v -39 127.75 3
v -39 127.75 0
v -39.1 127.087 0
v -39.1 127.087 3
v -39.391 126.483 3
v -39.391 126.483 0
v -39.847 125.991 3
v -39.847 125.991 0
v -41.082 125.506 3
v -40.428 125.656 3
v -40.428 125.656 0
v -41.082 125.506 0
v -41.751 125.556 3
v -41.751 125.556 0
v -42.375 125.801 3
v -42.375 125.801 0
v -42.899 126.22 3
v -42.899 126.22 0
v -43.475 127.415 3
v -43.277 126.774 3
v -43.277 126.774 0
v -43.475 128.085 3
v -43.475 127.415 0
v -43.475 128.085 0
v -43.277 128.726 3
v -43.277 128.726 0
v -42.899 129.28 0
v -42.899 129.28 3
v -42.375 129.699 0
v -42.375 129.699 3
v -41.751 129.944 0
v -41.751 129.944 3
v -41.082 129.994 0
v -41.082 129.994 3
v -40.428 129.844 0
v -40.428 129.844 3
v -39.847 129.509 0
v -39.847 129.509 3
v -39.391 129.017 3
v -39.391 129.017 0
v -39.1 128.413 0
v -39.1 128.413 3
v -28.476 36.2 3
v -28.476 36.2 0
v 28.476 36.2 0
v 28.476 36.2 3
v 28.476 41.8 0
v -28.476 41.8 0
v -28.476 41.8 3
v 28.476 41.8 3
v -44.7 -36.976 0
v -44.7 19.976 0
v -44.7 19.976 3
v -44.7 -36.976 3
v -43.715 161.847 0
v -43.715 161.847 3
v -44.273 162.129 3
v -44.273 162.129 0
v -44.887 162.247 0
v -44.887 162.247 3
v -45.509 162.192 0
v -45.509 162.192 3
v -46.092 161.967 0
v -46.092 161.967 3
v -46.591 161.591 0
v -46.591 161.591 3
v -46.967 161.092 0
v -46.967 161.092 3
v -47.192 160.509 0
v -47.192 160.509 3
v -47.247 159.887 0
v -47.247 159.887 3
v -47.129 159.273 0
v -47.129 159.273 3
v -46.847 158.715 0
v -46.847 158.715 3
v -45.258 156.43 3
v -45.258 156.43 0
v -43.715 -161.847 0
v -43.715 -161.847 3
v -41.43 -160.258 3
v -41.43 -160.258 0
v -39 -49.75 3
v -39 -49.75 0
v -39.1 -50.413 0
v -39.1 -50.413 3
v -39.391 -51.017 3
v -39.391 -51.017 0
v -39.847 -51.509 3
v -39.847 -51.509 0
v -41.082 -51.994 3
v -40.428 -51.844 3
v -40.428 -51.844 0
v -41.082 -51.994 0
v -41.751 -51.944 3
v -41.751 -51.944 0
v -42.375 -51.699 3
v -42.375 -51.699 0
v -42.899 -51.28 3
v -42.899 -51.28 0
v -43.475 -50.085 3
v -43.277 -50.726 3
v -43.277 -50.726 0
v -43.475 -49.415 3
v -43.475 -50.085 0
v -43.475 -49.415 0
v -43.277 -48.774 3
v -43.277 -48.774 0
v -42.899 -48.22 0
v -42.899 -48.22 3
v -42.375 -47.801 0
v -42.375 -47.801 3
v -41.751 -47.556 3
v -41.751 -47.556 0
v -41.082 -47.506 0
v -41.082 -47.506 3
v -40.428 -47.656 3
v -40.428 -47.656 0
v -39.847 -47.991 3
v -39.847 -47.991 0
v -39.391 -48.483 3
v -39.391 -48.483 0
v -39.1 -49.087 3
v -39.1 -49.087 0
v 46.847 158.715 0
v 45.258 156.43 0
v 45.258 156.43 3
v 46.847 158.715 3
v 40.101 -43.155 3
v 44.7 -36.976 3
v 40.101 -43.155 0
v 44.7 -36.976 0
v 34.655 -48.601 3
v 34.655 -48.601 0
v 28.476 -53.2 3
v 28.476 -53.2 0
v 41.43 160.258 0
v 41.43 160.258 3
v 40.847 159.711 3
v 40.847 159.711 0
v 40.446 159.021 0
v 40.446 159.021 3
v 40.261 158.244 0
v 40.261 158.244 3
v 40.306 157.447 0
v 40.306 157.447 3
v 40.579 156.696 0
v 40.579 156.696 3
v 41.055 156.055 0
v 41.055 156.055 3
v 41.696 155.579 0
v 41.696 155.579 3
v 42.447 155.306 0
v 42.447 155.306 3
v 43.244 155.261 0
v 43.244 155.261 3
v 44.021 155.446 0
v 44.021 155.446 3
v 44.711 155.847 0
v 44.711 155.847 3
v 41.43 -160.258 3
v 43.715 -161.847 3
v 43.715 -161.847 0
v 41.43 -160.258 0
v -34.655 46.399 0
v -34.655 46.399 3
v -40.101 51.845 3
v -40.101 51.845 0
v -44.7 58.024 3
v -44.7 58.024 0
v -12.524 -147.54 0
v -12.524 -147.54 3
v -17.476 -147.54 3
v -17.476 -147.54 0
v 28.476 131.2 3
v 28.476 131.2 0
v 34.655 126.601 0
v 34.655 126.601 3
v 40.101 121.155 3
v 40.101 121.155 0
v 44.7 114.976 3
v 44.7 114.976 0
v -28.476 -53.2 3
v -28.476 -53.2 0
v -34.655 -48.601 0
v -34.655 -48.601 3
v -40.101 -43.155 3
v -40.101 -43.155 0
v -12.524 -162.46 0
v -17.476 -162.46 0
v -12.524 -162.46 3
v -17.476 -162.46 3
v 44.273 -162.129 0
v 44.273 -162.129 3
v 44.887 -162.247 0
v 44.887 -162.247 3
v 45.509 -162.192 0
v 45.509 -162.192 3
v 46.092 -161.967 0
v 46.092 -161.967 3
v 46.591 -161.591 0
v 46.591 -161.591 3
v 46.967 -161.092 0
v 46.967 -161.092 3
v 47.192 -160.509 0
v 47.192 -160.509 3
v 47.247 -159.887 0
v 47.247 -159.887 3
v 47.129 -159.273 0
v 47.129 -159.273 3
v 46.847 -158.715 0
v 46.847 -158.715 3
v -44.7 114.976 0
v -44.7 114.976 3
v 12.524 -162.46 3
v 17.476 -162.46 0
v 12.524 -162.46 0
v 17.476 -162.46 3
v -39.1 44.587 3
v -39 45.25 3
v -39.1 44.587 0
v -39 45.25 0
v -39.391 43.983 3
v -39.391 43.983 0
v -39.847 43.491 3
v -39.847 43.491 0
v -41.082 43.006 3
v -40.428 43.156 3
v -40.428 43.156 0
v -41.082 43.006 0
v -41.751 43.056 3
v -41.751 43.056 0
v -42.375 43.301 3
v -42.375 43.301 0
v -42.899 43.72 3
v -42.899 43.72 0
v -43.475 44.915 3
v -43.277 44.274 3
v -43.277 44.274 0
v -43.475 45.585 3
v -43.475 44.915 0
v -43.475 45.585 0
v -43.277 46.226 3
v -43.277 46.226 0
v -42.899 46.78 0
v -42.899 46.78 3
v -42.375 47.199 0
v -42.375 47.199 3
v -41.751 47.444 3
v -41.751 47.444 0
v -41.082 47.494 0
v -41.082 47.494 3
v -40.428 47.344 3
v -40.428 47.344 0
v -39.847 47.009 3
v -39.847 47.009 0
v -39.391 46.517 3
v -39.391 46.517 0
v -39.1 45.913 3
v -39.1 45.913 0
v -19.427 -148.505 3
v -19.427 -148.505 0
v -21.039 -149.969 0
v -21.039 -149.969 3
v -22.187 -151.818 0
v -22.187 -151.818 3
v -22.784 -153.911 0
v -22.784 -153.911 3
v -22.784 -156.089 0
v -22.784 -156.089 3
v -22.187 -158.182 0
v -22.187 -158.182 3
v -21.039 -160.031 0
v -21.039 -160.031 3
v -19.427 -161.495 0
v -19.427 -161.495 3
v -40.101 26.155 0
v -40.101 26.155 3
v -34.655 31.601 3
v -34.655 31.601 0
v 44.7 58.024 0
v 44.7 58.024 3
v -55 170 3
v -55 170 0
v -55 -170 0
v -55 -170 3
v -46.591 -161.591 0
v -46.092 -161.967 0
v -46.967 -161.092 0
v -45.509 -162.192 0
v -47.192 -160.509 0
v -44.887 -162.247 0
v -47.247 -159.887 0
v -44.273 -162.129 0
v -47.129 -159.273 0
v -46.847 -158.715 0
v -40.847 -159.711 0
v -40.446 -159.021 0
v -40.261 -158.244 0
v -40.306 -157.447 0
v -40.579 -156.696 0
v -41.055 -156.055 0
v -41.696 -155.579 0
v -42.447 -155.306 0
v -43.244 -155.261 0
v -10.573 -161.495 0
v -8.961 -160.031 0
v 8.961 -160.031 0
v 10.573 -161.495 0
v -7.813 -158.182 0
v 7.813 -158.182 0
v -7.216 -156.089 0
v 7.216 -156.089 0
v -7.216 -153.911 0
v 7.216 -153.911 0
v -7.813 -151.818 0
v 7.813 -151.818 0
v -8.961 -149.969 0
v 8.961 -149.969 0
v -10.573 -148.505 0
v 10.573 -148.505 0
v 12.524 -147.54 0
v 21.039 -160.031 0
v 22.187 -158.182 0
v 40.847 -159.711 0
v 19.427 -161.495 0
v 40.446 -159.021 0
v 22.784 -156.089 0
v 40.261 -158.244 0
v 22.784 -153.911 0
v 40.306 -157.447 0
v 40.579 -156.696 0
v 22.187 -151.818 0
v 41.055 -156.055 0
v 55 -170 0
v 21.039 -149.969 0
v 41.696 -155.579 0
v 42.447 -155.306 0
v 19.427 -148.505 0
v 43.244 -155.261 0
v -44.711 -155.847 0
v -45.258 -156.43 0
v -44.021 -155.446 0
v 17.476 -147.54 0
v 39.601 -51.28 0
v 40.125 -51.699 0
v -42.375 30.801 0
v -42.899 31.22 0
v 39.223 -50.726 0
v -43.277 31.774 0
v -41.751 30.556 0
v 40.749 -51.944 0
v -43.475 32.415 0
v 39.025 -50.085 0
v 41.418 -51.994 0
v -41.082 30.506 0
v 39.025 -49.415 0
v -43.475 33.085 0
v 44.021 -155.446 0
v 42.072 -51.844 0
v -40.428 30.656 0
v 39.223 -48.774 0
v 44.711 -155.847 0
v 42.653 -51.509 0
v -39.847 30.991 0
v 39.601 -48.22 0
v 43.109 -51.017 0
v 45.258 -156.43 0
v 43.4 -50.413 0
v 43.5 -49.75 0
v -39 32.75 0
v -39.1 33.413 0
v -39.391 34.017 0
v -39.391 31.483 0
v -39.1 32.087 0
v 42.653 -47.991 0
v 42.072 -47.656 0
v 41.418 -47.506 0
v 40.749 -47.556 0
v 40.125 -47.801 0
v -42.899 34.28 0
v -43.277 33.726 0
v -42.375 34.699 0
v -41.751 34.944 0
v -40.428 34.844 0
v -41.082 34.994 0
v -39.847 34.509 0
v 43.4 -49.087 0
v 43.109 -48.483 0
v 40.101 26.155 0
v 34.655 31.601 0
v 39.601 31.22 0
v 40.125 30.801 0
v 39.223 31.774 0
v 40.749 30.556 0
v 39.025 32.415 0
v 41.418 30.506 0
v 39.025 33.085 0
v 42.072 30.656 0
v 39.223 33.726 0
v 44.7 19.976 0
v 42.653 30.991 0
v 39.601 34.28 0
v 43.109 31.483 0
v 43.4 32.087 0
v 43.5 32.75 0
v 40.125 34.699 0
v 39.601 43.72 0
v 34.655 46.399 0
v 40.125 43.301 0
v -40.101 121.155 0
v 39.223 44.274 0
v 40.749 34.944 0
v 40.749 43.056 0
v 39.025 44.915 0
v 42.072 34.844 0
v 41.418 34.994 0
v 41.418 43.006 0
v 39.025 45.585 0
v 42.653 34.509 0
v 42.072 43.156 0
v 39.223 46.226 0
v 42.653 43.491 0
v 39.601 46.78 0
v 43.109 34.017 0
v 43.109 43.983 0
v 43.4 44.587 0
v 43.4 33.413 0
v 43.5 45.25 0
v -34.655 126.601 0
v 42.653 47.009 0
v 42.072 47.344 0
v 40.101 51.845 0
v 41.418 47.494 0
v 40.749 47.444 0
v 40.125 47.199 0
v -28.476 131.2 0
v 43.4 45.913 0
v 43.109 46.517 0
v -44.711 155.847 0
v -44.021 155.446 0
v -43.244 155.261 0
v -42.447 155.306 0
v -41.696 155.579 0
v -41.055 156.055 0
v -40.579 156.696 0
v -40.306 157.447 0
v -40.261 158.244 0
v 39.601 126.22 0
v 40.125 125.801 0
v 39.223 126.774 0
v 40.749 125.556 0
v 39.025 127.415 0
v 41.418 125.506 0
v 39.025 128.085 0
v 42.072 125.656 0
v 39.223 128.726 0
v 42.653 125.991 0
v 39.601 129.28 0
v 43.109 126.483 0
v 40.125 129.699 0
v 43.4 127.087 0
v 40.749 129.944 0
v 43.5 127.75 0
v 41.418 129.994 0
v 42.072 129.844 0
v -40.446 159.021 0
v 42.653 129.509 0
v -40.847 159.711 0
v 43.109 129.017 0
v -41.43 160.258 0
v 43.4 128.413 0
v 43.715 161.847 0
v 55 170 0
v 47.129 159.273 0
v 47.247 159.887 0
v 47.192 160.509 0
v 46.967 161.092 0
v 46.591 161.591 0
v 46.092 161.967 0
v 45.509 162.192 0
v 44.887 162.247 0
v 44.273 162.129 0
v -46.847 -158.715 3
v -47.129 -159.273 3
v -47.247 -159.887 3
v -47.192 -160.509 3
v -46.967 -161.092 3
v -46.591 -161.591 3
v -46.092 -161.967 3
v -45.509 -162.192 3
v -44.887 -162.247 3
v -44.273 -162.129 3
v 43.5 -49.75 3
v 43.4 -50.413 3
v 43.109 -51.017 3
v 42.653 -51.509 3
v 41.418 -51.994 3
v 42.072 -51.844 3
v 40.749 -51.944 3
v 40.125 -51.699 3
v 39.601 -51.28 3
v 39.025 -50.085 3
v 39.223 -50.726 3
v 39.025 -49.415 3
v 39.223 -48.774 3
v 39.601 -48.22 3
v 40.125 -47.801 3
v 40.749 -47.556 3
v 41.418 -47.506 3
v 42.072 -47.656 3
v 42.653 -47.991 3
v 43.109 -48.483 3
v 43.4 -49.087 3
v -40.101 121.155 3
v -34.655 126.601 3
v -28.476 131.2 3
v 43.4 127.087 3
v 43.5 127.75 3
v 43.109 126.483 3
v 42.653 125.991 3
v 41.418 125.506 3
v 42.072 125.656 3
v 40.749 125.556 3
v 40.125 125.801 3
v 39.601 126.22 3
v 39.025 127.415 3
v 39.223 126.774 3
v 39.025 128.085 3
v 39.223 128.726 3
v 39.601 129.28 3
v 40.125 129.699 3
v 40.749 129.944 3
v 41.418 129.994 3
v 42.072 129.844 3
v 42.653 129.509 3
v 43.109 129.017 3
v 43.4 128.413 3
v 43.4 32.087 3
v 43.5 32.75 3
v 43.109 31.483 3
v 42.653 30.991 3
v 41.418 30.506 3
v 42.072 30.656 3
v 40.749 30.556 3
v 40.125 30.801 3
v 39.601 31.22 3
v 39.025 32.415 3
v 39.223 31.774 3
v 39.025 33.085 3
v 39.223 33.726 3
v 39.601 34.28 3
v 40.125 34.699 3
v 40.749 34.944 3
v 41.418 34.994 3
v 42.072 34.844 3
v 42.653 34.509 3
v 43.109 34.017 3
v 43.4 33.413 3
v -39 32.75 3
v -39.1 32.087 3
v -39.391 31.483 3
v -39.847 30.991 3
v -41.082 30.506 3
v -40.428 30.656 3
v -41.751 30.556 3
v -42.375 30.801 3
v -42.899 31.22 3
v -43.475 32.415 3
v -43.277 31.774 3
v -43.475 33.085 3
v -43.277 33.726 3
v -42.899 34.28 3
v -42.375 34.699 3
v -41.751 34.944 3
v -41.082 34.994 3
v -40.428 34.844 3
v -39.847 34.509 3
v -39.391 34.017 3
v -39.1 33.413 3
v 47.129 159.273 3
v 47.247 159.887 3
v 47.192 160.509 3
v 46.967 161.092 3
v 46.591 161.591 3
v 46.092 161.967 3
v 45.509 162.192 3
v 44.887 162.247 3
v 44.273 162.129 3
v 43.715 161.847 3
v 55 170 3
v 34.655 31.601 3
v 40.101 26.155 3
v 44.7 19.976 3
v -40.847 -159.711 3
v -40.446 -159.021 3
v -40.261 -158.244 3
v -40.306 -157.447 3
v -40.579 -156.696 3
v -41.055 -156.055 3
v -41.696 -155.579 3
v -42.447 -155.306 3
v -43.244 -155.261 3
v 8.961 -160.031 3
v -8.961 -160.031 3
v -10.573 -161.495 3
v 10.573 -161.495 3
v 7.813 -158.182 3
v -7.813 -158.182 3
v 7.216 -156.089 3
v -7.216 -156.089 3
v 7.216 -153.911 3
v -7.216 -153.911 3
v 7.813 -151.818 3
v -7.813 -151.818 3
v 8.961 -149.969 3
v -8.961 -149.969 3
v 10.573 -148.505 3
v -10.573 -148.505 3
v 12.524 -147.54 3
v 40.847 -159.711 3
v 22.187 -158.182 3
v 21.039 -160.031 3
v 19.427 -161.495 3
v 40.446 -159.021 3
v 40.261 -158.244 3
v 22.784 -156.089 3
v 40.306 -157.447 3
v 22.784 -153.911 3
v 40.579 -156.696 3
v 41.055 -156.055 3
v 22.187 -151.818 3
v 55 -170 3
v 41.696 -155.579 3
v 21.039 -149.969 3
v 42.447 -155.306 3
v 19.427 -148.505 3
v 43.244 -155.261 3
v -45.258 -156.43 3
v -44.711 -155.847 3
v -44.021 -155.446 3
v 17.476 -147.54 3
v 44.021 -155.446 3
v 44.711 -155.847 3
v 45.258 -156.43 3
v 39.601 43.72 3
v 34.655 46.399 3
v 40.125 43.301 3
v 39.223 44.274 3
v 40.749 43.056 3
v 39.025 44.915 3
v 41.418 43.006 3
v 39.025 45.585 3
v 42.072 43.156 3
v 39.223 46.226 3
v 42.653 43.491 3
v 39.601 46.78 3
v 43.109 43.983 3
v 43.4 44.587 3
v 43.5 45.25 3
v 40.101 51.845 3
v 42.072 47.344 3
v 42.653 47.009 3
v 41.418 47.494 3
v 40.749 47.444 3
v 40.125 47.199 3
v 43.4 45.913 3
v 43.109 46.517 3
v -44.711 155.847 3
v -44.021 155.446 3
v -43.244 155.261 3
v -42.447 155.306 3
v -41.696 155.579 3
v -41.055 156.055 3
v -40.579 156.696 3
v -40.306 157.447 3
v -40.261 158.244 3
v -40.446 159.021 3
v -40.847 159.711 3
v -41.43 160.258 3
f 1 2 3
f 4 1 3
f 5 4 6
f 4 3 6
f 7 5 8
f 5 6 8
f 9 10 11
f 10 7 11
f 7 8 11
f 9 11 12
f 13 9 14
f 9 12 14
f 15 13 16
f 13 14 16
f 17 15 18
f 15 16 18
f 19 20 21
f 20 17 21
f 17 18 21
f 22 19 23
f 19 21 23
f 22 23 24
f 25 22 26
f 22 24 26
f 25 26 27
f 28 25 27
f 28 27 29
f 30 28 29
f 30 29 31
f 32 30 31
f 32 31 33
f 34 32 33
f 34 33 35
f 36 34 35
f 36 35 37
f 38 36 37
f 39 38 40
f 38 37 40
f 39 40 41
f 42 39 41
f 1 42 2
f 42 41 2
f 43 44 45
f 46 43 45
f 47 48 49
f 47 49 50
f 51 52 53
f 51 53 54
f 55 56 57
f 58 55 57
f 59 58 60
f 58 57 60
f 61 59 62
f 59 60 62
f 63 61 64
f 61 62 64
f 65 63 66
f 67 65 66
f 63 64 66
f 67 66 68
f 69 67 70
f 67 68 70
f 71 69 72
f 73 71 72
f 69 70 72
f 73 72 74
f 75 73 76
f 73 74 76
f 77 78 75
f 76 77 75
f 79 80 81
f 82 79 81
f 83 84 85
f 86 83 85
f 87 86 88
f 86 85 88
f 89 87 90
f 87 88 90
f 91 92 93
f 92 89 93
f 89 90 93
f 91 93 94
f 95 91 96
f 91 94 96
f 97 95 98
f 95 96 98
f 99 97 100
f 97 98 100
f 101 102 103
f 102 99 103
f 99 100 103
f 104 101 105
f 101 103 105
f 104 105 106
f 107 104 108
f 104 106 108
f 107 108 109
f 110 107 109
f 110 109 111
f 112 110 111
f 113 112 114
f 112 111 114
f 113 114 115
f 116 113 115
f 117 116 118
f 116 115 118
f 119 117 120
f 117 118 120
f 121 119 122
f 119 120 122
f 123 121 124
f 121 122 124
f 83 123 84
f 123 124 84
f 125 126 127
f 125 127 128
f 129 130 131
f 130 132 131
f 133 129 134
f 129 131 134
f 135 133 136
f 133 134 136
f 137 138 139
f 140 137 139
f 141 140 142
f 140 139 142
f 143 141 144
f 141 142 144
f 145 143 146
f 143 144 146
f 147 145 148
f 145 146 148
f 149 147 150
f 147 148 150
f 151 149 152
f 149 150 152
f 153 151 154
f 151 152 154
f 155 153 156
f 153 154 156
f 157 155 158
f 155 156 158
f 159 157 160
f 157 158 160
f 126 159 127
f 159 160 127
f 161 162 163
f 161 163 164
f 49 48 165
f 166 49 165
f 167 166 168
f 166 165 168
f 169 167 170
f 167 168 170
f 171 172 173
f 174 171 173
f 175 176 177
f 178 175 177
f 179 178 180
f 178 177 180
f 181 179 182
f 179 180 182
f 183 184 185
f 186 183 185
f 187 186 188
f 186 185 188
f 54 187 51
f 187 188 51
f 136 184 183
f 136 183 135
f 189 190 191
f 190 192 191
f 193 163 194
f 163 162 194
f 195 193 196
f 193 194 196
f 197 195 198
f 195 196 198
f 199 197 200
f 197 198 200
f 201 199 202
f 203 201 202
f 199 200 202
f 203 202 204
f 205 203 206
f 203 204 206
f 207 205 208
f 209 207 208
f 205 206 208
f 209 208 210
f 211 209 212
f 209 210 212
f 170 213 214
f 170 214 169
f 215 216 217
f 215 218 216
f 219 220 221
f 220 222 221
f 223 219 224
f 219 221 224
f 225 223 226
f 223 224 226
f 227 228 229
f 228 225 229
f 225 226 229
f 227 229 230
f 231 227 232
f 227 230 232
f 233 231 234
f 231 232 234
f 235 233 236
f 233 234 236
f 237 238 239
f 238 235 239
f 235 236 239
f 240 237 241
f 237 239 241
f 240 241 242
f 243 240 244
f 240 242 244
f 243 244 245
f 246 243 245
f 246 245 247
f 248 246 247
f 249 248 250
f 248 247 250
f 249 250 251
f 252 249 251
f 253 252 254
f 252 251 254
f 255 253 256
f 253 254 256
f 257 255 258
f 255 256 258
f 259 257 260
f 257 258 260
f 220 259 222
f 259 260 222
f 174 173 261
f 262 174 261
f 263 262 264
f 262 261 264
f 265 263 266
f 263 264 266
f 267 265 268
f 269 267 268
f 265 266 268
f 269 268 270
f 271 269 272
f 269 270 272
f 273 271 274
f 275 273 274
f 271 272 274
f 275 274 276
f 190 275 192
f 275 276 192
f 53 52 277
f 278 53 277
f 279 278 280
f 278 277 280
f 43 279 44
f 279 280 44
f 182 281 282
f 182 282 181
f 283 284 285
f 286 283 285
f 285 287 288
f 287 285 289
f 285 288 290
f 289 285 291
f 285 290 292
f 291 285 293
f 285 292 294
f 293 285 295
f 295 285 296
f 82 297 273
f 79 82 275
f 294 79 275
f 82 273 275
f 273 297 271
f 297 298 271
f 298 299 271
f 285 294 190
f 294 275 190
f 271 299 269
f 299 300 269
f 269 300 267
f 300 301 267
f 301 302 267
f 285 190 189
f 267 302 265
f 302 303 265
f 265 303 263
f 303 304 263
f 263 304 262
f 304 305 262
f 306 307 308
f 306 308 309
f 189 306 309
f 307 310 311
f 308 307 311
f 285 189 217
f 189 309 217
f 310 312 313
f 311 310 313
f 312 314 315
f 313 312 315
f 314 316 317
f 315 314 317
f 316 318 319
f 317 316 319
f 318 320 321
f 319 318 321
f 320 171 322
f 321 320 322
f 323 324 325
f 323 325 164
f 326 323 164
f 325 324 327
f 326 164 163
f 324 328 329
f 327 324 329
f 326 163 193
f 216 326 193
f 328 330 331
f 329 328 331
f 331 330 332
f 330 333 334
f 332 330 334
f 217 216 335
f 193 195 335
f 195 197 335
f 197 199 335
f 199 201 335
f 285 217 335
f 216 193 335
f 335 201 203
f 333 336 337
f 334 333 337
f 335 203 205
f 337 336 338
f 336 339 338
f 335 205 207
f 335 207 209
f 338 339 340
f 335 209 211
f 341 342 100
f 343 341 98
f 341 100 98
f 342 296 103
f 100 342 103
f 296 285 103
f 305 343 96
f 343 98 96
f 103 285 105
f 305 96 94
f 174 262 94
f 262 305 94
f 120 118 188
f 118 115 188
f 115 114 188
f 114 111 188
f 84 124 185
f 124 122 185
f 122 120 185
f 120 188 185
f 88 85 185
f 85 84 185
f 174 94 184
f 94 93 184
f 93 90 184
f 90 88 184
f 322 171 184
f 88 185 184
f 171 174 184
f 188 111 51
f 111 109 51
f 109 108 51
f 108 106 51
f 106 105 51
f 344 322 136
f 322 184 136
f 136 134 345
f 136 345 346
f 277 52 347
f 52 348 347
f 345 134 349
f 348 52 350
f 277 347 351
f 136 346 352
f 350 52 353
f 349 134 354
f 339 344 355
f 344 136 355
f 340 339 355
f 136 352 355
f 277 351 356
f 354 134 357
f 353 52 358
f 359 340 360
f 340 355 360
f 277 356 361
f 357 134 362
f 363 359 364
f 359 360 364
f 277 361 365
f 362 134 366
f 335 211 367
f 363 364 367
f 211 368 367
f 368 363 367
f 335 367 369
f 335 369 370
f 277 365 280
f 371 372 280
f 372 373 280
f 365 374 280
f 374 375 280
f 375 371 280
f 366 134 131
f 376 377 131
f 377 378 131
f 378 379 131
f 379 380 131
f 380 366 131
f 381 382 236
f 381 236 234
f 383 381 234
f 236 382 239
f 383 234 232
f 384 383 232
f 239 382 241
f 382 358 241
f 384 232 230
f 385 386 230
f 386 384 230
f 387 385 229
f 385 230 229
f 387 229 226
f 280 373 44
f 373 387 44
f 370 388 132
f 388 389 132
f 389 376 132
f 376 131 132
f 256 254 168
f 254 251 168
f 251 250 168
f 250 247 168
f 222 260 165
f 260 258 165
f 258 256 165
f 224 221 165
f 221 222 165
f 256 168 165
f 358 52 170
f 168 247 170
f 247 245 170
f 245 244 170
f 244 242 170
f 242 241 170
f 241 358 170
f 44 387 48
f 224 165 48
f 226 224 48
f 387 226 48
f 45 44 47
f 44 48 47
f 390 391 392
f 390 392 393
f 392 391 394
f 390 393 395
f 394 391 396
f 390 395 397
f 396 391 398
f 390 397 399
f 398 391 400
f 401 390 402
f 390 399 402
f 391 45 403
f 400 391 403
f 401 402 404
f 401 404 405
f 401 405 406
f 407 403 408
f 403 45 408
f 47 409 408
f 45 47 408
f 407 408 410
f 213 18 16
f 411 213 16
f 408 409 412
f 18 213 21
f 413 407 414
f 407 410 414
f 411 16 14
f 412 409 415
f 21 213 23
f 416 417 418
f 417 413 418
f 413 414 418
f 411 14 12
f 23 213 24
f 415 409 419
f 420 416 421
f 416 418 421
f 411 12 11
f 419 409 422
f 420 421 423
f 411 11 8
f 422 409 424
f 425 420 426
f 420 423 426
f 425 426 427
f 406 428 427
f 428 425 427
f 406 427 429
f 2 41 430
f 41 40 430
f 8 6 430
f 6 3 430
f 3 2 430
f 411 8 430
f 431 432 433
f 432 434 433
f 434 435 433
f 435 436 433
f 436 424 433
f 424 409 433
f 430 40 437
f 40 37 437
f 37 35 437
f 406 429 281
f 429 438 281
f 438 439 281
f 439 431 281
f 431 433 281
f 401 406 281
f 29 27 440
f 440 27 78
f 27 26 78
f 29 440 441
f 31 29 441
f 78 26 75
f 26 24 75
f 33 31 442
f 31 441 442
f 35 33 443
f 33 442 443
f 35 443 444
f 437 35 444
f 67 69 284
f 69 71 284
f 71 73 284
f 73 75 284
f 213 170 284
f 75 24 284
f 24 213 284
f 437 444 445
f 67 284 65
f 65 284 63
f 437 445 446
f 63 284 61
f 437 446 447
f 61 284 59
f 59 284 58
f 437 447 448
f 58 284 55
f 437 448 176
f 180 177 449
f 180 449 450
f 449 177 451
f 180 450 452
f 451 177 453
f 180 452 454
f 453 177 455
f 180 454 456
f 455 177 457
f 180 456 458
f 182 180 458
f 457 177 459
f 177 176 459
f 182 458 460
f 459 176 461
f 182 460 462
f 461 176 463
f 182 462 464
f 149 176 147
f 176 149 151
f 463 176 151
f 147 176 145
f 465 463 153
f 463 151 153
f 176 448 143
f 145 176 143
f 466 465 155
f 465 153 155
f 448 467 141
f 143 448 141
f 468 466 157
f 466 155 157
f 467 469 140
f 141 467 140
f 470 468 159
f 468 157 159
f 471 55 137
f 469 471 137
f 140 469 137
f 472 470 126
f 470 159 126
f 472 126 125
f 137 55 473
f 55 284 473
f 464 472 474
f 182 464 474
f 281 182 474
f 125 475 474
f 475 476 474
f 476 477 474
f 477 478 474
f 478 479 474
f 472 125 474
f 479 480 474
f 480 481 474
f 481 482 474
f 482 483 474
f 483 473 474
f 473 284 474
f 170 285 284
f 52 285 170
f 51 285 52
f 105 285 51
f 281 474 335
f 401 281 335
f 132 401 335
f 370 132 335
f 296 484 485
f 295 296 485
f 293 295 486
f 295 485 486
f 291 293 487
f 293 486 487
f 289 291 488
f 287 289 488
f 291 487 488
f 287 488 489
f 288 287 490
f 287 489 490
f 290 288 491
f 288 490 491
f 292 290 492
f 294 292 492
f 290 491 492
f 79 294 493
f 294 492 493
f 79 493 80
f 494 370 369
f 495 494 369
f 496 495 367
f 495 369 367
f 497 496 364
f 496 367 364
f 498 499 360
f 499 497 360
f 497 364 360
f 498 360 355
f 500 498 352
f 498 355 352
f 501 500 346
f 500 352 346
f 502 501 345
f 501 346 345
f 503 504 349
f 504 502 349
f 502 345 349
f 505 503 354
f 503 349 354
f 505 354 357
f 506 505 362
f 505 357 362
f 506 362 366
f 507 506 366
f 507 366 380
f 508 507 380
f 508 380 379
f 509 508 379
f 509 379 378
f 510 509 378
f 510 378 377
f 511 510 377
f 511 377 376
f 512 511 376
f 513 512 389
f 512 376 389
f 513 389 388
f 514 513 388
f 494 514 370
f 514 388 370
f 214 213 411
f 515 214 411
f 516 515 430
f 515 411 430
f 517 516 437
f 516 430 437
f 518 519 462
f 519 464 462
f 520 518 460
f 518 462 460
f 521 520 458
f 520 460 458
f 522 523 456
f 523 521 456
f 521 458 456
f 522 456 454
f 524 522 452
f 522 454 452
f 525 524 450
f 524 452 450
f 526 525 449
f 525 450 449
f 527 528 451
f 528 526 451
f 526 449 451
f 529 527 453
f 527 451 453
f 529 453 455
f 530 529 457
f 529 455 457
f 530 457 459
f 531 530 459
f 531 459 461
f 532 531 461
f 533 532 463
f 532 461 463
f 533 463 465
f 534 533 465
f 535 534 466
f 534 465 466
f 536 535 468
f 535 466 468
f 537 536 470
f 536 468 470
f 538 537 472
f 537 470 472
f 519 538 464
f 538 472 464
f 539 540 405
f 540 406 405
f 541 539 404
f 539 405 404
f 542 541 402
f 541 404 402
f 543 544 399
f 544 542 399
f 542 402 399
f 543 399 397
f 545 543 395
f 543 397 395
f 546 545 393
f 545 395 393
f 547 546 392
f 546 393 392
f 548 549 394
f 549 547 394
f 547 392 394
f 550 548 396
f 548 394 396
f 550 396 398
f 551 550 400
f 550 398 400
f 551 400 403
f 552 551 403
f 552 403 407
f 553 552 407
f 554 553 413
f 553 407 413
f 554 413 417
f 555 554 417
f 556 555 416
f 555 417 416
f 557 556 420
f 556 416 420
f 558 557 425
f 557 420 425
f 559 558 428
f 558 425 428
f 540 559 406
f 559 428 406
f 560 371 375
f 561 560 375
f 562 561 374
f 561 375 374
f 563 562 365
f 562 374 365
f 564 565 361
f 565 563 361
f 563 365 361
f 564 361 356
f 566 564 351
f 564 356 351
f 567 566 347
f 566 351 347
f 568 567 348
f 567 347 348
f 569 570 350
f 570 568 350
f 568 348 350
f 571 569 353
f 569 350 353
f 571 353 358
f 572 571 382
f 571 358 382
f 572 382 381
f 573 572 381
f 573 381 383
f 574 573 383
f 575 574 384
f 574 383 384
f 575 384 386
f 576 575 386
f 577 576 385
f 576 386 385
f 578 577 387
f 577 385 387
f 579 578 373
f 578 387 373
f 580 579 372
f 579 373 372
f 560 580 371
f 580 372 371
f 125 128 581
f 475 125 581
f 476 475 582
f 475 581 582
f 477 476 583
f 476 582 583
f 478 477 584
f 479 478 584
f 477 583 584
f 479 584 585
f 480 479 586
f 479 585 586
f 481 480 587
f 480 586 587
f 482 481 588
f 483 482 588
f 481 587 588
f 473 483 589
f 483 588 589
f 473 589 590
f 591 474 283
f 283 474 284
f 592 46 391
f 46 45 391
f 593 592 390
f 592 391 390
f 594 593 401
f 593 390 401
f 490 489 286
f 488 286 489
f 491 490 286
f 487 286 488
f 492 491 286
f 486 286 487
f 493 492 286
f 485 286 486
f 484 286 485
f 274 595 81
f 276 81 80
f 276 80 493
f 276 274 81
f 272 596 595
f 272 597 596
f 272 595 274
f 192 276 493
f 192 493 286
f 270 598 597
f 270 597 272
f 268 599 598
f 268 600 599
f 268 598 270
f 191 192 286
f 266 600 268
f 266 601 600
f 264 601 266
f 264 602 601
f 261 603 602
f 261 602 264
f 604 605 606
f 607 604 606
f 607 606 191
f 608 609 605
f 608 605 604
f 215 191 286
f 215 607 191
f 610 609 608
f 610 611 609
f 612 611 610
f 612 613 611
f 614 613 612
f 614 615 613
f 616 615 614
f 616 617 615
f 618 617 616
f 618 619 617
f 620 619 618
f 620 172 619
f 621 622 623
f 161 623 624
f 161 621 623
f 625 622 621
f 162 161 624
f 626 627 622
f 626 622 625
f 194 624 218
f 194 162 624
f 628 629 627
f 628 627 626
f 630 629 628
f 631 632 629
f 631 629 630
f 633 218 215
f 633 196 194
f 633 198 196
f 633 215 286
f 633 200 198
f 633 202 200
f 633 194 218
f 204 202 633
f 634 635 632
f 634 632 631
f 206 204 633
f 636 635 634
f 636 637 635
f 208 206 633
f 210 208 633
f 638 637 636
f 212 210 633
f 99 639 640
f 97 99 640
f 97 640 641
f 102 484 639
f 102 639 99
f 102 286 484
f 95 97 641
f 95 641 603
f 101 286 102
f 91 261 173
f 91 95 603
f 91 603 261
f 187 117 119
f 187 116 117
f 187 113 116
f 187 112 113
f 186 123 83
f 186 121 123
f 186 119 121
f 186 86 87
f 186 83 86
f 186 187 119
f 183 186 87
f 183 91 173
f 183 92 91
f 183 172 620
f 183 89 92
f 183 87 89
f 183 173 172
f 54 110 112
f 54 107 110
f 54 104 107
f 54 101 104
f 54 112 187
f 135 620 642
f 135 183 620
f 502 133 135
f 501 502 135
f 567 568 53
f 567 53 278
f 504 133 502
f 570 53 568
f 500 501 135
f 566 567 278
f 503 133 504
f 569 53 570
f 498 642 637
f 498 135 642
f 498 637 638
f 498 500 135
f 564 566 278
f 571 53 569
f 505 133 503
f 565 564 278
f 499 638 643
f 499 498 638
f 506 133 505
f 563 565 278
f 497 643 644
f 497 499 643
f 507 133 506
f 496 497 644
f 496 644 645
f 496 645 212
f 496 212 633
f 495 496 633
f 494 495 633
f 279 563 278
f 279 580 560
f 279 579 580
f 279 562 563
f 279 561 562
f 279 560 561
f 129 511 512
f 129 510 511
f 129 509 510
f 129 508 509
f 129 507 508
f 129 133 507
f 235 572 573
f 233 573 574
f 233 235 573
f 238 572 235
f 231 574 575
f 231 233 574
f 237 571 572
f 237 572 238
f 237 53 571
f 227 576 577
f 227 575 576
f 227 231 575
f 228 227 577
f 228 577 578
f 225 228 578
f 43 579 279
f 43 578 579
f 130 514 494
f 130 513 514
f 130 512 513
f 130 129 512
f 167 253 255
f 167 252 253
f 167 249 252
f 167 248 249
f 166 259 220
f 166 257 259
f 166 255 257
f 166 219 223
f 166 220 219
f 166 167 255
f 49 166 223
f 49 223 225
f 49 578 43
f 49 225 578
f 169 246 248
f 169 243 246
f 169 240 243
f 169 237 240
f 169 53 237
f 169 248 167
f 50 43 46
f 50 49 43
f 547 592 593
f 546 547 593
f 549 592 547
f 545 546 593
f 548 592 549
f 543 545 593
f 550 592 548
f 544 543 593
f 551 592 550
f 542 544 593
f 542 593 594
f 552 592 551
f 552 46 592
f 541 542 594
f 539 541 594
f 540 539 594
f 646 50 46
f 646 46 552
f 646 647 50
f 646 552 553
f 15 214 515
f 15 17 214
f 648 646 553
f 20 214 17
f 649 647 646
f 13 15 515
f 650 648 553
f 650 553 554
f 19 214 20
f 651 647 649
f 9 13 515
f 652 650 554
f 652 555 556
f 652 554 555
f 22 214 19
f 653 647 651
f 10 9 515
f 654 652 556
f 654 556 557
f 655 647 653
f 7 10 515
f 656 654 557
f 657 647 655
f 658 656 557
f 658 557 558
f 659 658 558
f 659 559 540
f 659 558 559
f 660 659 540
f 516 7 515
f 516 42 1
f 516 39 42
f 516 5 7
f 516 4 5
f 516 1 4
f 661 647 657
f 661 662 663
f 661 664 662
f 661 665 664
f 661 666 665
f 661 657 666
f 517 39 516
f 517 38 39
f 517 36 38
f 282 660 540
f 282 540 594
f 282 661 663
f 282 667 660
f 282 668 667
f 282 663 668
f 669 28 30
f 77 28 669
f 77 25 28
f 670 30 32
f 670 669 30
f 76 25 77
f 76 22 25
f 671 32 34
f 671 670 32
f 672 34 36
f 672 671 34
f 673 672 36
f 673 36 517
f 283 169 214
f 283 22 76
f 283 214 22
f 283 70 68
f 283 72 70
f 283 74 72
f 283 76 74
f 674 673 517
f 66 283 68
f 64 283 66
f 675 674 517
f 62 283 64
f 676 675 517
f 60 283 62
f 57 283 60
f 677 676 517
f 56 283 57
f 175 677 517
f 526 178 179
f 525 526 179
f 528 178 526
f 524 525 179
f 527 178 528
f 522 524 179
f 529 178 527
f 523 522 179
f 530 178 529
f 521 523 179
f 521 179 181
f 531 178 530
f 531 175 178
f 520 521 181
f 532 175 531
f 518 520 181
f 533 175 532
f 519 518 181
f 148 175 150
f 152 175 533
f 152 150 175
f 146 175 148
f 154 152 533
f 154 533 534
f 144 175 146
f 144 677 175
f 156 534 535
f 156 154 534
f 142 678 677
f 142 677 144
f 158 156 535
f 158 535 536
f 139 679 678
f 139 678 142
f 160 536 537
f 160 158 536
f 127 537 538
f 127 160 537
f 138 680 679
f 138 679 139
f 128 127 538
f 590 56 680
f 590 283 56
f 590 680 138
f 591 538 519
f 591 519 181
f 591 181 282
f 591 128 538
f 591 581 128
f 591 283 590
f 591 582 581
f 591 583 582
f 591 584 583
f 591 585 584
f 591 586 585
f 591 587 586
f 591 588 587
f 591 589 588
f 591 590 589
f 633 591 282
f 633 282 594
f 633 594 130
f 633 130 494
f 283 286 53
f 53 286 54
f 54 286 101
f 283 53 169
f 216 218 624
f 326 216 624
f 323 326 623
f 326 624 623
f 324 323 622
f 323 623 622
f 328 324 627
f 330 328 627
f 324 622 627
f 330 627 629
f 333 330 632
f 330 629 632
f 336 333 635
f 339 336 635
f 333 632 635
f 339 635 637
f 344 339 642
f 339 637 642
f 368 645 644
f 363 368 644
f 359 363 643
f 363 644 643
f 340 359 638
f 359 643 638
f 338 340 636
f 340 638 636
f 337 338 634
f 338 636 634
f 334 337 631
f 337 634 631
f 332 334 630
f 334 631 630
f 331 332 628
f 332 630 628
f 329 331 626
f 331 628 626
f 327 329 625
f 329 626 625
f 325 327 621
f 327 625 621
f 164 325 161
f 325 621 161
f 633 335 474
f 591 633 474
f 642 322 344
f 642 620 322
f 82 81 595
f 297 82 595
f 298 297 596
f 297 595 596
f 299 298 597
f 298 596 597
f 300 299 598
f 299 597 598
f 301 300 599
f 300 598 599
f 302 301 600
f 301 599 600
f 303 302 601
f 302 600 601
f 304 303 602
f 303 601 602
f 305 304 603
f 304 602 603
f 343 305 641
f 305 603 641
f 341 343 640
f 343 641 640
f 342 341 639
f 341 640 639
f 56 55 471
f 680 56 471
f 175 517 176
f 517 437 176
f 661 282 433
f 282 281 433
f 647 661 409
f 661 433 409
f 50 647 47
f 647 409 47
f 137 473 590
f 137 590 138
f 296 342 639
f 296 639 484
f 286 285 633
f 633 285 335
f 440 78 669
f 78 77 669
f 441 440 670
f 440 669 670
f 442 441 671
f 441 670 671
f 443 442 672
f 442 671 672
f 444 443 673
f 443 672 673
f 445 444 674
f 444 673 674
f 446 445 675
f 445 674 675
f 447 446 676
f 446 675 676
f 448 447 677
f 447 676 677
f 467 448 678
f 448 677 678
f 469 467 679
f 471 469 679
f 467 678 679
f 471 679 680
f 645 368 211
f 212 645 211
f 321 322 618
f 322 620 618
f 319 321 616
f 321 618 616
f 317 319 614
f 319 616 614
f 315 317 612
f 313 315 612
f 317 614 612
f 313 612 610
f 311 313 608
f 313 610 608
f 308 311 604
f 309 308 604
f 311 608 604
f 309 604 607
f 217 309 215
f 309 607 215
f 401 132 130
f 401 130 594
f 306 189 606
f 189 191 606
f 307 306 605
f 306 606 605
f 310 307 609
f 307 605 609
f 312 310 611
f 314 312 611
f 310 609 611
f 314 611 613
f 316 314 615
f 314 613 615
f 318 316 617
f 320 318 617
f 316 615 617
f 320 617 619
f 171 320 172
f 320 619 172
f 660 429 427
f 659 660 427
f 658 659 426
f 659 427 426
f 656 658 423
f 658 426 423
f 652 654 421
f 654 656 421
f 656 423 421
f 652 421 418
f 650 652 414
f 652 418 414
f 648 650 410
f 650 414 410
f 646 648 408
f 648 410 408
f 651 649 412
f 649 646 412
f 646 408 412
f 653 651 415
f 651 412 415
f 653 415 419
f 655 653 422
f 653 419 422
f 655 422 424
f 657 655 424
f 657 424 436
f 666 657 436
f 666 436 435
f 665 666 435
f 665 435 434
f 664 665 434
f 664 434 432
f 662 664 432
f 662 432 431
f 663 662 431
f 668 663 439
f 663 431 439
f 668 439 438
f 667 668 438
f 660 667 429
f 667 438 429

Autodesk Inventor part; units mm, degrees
ref_plane "YZ Plane" through (0, 0, 0) normal (1, 0, 0) x (0, 1, 0)
ref_plane "XZ Plane" through (0, 0, 0) normal (0, 1, 0) x (-1, 0, 0)
ref_plane "XY Plane" through (0, 0, 0) normal (0, 0, 1) x (1, 0, 0)
sketch "スケッチ1" plane through (0, 0, 0) normal (0, 0, 1) x (1, 0, 0)
  line L0 (-55, -170) -> (55, -170)
  line L1 (55, -170) -> (55, 170)
  line L2 (55, 170) -> (-55, 170)
  line L3 (-55, 170) -> (-55, -170)
  line L4 (-55, -170) -> (55, 170) construction
  line L5 (55, -170) -> (-55, 170) construction
  line L6 (-55, 140) -> (-50, 140) construction
  line L7 (-50, 140) -> (-25, 165) construction
  line L8 (-25, 165) -> (-25, 170) construction
  line L9 (-46, 40.5) -> (46, 40.5) construction
  line L10 (46, 40.5) -> (46, 132.5) construction
  line L11 (46, 132.5) -> (-46, 132.5) construction
  line L12 (-46, 132.5) -> (-46, 40.5) construction
  line L13 (-46, 40.5) -> (46, 132.5) construction
  line L14 (46, 40.5) -> (-46, 132.5) construction
  line L15 (-46, 1.5) -> (46, 1.5) construction
  line L16 (46, 1.5) -> (46, 37.5) construction
  line L17 (46, 37.5) -> (-46, 37.5) construction
  line L18 (-46, 37.5) -> (-46, 1.5) construction
  line L19 (-46, 1.5) -> (46, 37.5) construction
  line L20 (46, 1.5) -> (-46, 37.5) construction
  line L21 (0, 0) -> (0, 86.5) construction
  circle A0 centre (0, 86.5) radius 53 construction
  line L22 (-44.7, 41.8) -> (44.7, 41.8) construction
  line L23 (44.7, 41.8) -> (44.7, 131.2) construction
  line L24 (44.7, 131.2) -> (-44.7, 131.2) construction
  line L25 (-44.7, 131.2) -> (-44.7, 41.8) construction
  line L26 (-44.7, 41.8) -> (44.7, 131.2) construction
  line L27 (44.7, 41.8) -> (-44.7, 131.2) construction
  arc A1 (-28.4765, 131.2) -> (-44.7, 114.9765) centre (0, 86.5) ccw
  arc A2 (-44.7, 58.0235) -> (-28.4765, 41.8) centre (0, 86.5) ccw
  arc A3 (28.4765, 41.8) -> (44.7, 58.0235) centre (0, 86.5) ccw
  arc A4 (44.7, 114.9765) -> (28.4765, 131.2) centre (0, 86.5) ccw
  line L28 (-28.4765, 131.2) -> (28.4765, 131.2)
  line L29 (-44.7, 114.9765) -> (-44.7, 58.0235)
  line L30 (-28.4765, 41.8) -> (28.4765, 41.8)
  line L31 (44.7, 58.0235) -> (44.7, 114.9765)
  line L32 (-41.25, 45.25) -> (41.25, 45.25) construction
  line L33 (41.25, 45.25) -> (41.25, 127.75) construction
  line L34 (41.25, 127.75) -> (-41.25, 127.75) construction
  line L35 (-41.25, 127.75) -> (-41.25, 45.25) construction
  line L36 (-41.25, 45.25) -> (41.25, 127.75) construction
  line L37 (41.25, 45.25) -> (-41.25, 127.75) construction
  circle A5 centre (-41.25, 127.75) radius 2.25
  circle A6 centre (-41.25, 45.25) radius 2.25
  circle A7 centre (41.25, 45.25) radius 2.25
  circle A8 centre (41.25, 127.75) radius 2.25
  circle A9 centre (-45, 160) radius 2.25
  circle A10 centre (45, 160) radius 2.25
  circle A11 centre (45, -160) radius 2.25
  circle A12 centre (-45, -160) radius 2.25
  circle A13 centre (-45, 0) radius 2.25 construction
  circle A14 centre (45, 0) radius 2.25 construction
  line L38 (-55, 0) -> (55, 0) construction
  circle A15 centre (-41.25, -49.75) radius 2.25
  arc A16 (-44.7, -36.9765) -> (-28.4765, -53.2) centre (0, -8.5) ccw
  line L39 (-28.4765, -53.2) -> (28.4765, -53.2)
  arc A17 (28.4765, -53.2) -> (44.7, -36.9765) centre (0, -8.5) ccw
  circle A18 centre (41.25, -49.75) radius 2.25
  line L40 (44.7, -36.9765) -> (44.7, 19.9765)
  circle A19 centre (41.25, 32.75) radius 2.25
  arc A20 (44.7, 19.9765) -> (28.4765, 36.2) centre (0, -8.5) ccw
  line L41 (-28.4765, 36.2) -> (28.4765, 36.2)
  circle A21 centre (-41.25, 32.75) radius 2.25
  arc A22 (-28.4765, 36.2) -> (-44.7, 19.9765) centre (0, -8.5) ccw
  line L42 (-44.7, 19.9765) -> (-44.7, -36.9765)
  circle A23 centre (-41.25, -144.75) radius 2.25
  arc A24 (-44.7, -131.9765) -> (-28.4765, -148.2) centre (0, -103.5) ccw
  line L43 (-28.4765, -148.2) -> (28.4765, -148.2)
  arc A25 (28.4765, -148.2) -> (44.7, -131.9765) centre (0, -103.5) ccw
  circle A26 centre (41.25, -144.75) radius 2.25
  line L44 (44.7, -131.9765) -> (44.7, -75.0235)
  circle A27 centre (41.25, -62.25) radius 2.25
  arc A28 (44.7, -75.0235) -> (28.4765, -58.8) centre (0, -103.5) ccw
  line L45 (-28.4765, -58.8) -> (28.4765, -58.8)
  circle A29 centre (-41.25, -62.25) radius 2.25
  arc A30 (-28.4765, -58.8) -> (-44.7, -75.0235) centre (0, -103.5) ccw
  line L46 (-44.7, -75.0235) -> (-44.7, -131.9765)
  point P0 (0, 19.5)
  point P1 (0, 19.5)
  dimension "d12" = 106
  dimension "d0" = 110
  dimension "d1" = 340
  dimension "d2" = 135
  dimension "d3" = 30
  dimension "d4" = 30
  dimension "d5" = 5
  dimension "d6" = 92
  dimension "d7" = 92
  dimension "d8" = 92
  dimension "d9" = 36
  dimension "d10" = 3
  dimension "d11" = 1.5
  dimension "d13" = 89.4
  dimension "d14" = 89.4
  dimension "d15" = 82.5
  dimension "d16" = 82.5
  dimension "d17" = 4.5
  dimension "d25" = 4.5
  dimension "d26" = 10
  dimension "d27" = 10
  dimension "d28" = 10
  dimension "d29" = 10
  dimension "d30" = 10
  dimension "d31" = 10
  dimension "d32" = 10
  dimension "d33" = 10
  dimension "d34" = 10
  dimension "d35" = 10
  dimension "d45" = 95
extrude "押し出し1" add sketch "スケッチ1" along normal blind 3 contours L3 L2 L1 L0 | A23 | L46 A30 L45 A28 L44 A25 L43 A24 | A26 | A27 | A29
sketch "スケッチ2" plane through (0, 0, 3) normal (0, 0, 1) x (1, 0, 0)
  circle A0 centre (-45, 160) radius 2.25 construction
  circle A1 centre (45, -160) radius 2.25 construction
  circle A2 centre (-45, -160) radius 2.25 construction
  circle A3 centre (-43, 158) radius 2.75 construction
  line L0 (55, 170) -> (-55, 170) projected
  line L1 (-55, 170) -> (-55, -170) projected
  line L2 (-43.7153, 161.8472) -> (-41.4298, 160.2577)
  line L3 (-45.2577, 156.4298) -> (-46.8472, 158.7153)
  circle A4 centre (-45, 160) radius 2.25 construction
  arc A5 (-43.7153, 161.8472) -> (-46.8472, 158.7153) centre (-45, 160) ccw
  arc A6 (-45.2577, 156.4298) -> (-41.4298, 160.2577) centre (-43, 158) ccw
  line L4 (55, 170) -> (-55, 170) construction
  line L5 (0, 170) -> (0, -170) construction
  line L6 (-55, -170) -> (55, -170) construction
  line L7 (-55, 0) -> (55, 0) construction
  line L8 (55, -170) -> (55, 170) construction
  circle A7 centre (45, 160) radius 2.25 construction
  circle A8 centre (43, 158) radius 2.75 construction
  line L9 (43.7153, 161.8472) -> (41.4298, 160.2577)
  line L10 (45.2577, 156.4298) -> (46.8472, 158.7153)
  circle A9 centre (45, 160) radius 2.25 construction
  arc A10 (46.8472, 158.7153) -> (43.7153, 161.8472) centre (45, 160) ccw
  arc A11 (41.4298, 160.2577) -> (45.2577, 156.4298) centre (43, 158) ccw
  circle A12 centre (-45, -160) radius 2.25 construction
  circle A13 centre (-43, -158) radius 2.75 construction
  line L11 (-43.7153, -161.8472) -> (-41.4298, -160.2577)
  line L12 (-45.2577, -156.4298) -> (-46.8472, -158.7153)
  circle A14 centre (-45, -160) radius 2.25 construction
  arc A15 (-46.8472, -158.7153) -> (-43.7153, -161.8472) centre (-45, -160) ccw
  arc A16 (-41.4298, -160.2577) -> (-45.2577, -156.4298) centre (-43, -158) ccw
  circle A17 centre (45, -160) radius 2.25 construction
  line L13 (45.2577, -156.4298) -> (46.8472, -158.7153)
  arc A18 (45.2577, -156.4298) -> (41.4298, -160.2577) centre (43, -158) ccw
  circle A19 centre (43, -158) radius 2.75 construction
  line L14 (43.7153, -161.8472) -> (41.4298, -160.2577)
  circle A20 centre (45, -160) radius 2.25 construction
  arc A21 (43.7153, -161.8472) -> (46.8472, -158.7153) centre (45, -160) ccw
  point P0 (0, 0)
  dimension "d38" = 5.5
  dimension "d39" = 12
  dimension "d40" = 12
extrude "押し出し2" cut sketch "スケッチ2" against normal through all
sketch "スケッチ3" plane through (0, 0, 3) normal (0, 0, 1) x (1, 0, 0)
  line L0 (-55, -170) -> (55, -170) construction
  line L1 (-55, 170) -> (-55, -170) construction
  line L2 (55, -170) -> (55, 170) construction
  line L3 (0, -170) -> (0, -116.79) construction
  arc A0 (-17.4739, -147.55) -> (-17.4739, -162.45) centre (-15, -155) ccw construction
  line L4 (-17.4739, -147.55) -> (-12.5261, -147.55) construction
  line L5 (-12.5261, -162.45) -> (-17.4739, -162.45) construction
  arc A1 (-12.5261, -147.55) -> (-17.4739, -147.55) centre (-15, -155) ccw construction
  arc A2 (-12.5261, -162.45) -> (-12.5261, -147.55) centre (-15, -155) ccw construction
  arc A3 (-17.4739, -162.45) -> (-12.5261, -162.45) centre (-15, -155) ccw construction
  line L6 (-17.4755, -162.46) -> (-12.5245, -162.46)
  arc A4 (-12.5245, -162.46) -> (-12.5245, -147.54) centre (-15, -155) ccw
  line L7 (-12.5245, -147.54) -> (-17.4755, -147.54)
  arc A5 (-17.4755, -147.54) -> (-17.4755, -162.46) centre (-15, -155) ccw
  line L8 (17.4755, -162.46) -> (12.5245, -162.46)
  arc A6 (12.5245, -147.54) -> (12.5245, -162.46) centre (15, -155) ccw
  line L9 (12.5245, -147.54) -> (17.4755, -147.54)
  arc A7 (17.4755, -162.46) -> (17.4755, -147.54) centre (15, -155) ccw
  point P0 (0, 0)
  dimension "d50" = 15.7
  dimension "d51" = 14.9
  dimension "d52" = 15
  dimension "d53" = 15
  dimension "d54" = 40
  dimension "d55" = 0.01
extrude "押し出し3" cut sketch "スケッチ3" against normal through all
sketch "スケッチ4" plane through (0, 0, 3) normal (0, 0, 1) x (1, 0, 0)
  line L0 (-55, 170) -> (-55, -170) projected
  line L1 (-55, 170) -> (55, 170)
  line L2 (55, 170) -> (55, 167)
  line L3 (55, 167) -> (-55, 167)
  line L4 (-55, 167) -> (-55, 170)
  point P0 (0, 0)
  dimension "d58" = 3
extrude "押し出し4" [suppressed]
equation "\"d4\" = d3"
equation "\"d11\" = 0.5 * d10"
equation "\"d27\" = d26"
equation "\"d28\" = d26"
equation "\"d29\" = d26"
equation "\"d30\" = d26"
equation "\"d31\" = d26"
equation "\"d32\" = d26"
equation "\"d33\" = d26"
equation "\"d34\" = d26"
equation "\"d35\" = d26"
equation "\"d45\" = d7 + d10"
properties part number "top_panel" material "アルミニウム 6061"
